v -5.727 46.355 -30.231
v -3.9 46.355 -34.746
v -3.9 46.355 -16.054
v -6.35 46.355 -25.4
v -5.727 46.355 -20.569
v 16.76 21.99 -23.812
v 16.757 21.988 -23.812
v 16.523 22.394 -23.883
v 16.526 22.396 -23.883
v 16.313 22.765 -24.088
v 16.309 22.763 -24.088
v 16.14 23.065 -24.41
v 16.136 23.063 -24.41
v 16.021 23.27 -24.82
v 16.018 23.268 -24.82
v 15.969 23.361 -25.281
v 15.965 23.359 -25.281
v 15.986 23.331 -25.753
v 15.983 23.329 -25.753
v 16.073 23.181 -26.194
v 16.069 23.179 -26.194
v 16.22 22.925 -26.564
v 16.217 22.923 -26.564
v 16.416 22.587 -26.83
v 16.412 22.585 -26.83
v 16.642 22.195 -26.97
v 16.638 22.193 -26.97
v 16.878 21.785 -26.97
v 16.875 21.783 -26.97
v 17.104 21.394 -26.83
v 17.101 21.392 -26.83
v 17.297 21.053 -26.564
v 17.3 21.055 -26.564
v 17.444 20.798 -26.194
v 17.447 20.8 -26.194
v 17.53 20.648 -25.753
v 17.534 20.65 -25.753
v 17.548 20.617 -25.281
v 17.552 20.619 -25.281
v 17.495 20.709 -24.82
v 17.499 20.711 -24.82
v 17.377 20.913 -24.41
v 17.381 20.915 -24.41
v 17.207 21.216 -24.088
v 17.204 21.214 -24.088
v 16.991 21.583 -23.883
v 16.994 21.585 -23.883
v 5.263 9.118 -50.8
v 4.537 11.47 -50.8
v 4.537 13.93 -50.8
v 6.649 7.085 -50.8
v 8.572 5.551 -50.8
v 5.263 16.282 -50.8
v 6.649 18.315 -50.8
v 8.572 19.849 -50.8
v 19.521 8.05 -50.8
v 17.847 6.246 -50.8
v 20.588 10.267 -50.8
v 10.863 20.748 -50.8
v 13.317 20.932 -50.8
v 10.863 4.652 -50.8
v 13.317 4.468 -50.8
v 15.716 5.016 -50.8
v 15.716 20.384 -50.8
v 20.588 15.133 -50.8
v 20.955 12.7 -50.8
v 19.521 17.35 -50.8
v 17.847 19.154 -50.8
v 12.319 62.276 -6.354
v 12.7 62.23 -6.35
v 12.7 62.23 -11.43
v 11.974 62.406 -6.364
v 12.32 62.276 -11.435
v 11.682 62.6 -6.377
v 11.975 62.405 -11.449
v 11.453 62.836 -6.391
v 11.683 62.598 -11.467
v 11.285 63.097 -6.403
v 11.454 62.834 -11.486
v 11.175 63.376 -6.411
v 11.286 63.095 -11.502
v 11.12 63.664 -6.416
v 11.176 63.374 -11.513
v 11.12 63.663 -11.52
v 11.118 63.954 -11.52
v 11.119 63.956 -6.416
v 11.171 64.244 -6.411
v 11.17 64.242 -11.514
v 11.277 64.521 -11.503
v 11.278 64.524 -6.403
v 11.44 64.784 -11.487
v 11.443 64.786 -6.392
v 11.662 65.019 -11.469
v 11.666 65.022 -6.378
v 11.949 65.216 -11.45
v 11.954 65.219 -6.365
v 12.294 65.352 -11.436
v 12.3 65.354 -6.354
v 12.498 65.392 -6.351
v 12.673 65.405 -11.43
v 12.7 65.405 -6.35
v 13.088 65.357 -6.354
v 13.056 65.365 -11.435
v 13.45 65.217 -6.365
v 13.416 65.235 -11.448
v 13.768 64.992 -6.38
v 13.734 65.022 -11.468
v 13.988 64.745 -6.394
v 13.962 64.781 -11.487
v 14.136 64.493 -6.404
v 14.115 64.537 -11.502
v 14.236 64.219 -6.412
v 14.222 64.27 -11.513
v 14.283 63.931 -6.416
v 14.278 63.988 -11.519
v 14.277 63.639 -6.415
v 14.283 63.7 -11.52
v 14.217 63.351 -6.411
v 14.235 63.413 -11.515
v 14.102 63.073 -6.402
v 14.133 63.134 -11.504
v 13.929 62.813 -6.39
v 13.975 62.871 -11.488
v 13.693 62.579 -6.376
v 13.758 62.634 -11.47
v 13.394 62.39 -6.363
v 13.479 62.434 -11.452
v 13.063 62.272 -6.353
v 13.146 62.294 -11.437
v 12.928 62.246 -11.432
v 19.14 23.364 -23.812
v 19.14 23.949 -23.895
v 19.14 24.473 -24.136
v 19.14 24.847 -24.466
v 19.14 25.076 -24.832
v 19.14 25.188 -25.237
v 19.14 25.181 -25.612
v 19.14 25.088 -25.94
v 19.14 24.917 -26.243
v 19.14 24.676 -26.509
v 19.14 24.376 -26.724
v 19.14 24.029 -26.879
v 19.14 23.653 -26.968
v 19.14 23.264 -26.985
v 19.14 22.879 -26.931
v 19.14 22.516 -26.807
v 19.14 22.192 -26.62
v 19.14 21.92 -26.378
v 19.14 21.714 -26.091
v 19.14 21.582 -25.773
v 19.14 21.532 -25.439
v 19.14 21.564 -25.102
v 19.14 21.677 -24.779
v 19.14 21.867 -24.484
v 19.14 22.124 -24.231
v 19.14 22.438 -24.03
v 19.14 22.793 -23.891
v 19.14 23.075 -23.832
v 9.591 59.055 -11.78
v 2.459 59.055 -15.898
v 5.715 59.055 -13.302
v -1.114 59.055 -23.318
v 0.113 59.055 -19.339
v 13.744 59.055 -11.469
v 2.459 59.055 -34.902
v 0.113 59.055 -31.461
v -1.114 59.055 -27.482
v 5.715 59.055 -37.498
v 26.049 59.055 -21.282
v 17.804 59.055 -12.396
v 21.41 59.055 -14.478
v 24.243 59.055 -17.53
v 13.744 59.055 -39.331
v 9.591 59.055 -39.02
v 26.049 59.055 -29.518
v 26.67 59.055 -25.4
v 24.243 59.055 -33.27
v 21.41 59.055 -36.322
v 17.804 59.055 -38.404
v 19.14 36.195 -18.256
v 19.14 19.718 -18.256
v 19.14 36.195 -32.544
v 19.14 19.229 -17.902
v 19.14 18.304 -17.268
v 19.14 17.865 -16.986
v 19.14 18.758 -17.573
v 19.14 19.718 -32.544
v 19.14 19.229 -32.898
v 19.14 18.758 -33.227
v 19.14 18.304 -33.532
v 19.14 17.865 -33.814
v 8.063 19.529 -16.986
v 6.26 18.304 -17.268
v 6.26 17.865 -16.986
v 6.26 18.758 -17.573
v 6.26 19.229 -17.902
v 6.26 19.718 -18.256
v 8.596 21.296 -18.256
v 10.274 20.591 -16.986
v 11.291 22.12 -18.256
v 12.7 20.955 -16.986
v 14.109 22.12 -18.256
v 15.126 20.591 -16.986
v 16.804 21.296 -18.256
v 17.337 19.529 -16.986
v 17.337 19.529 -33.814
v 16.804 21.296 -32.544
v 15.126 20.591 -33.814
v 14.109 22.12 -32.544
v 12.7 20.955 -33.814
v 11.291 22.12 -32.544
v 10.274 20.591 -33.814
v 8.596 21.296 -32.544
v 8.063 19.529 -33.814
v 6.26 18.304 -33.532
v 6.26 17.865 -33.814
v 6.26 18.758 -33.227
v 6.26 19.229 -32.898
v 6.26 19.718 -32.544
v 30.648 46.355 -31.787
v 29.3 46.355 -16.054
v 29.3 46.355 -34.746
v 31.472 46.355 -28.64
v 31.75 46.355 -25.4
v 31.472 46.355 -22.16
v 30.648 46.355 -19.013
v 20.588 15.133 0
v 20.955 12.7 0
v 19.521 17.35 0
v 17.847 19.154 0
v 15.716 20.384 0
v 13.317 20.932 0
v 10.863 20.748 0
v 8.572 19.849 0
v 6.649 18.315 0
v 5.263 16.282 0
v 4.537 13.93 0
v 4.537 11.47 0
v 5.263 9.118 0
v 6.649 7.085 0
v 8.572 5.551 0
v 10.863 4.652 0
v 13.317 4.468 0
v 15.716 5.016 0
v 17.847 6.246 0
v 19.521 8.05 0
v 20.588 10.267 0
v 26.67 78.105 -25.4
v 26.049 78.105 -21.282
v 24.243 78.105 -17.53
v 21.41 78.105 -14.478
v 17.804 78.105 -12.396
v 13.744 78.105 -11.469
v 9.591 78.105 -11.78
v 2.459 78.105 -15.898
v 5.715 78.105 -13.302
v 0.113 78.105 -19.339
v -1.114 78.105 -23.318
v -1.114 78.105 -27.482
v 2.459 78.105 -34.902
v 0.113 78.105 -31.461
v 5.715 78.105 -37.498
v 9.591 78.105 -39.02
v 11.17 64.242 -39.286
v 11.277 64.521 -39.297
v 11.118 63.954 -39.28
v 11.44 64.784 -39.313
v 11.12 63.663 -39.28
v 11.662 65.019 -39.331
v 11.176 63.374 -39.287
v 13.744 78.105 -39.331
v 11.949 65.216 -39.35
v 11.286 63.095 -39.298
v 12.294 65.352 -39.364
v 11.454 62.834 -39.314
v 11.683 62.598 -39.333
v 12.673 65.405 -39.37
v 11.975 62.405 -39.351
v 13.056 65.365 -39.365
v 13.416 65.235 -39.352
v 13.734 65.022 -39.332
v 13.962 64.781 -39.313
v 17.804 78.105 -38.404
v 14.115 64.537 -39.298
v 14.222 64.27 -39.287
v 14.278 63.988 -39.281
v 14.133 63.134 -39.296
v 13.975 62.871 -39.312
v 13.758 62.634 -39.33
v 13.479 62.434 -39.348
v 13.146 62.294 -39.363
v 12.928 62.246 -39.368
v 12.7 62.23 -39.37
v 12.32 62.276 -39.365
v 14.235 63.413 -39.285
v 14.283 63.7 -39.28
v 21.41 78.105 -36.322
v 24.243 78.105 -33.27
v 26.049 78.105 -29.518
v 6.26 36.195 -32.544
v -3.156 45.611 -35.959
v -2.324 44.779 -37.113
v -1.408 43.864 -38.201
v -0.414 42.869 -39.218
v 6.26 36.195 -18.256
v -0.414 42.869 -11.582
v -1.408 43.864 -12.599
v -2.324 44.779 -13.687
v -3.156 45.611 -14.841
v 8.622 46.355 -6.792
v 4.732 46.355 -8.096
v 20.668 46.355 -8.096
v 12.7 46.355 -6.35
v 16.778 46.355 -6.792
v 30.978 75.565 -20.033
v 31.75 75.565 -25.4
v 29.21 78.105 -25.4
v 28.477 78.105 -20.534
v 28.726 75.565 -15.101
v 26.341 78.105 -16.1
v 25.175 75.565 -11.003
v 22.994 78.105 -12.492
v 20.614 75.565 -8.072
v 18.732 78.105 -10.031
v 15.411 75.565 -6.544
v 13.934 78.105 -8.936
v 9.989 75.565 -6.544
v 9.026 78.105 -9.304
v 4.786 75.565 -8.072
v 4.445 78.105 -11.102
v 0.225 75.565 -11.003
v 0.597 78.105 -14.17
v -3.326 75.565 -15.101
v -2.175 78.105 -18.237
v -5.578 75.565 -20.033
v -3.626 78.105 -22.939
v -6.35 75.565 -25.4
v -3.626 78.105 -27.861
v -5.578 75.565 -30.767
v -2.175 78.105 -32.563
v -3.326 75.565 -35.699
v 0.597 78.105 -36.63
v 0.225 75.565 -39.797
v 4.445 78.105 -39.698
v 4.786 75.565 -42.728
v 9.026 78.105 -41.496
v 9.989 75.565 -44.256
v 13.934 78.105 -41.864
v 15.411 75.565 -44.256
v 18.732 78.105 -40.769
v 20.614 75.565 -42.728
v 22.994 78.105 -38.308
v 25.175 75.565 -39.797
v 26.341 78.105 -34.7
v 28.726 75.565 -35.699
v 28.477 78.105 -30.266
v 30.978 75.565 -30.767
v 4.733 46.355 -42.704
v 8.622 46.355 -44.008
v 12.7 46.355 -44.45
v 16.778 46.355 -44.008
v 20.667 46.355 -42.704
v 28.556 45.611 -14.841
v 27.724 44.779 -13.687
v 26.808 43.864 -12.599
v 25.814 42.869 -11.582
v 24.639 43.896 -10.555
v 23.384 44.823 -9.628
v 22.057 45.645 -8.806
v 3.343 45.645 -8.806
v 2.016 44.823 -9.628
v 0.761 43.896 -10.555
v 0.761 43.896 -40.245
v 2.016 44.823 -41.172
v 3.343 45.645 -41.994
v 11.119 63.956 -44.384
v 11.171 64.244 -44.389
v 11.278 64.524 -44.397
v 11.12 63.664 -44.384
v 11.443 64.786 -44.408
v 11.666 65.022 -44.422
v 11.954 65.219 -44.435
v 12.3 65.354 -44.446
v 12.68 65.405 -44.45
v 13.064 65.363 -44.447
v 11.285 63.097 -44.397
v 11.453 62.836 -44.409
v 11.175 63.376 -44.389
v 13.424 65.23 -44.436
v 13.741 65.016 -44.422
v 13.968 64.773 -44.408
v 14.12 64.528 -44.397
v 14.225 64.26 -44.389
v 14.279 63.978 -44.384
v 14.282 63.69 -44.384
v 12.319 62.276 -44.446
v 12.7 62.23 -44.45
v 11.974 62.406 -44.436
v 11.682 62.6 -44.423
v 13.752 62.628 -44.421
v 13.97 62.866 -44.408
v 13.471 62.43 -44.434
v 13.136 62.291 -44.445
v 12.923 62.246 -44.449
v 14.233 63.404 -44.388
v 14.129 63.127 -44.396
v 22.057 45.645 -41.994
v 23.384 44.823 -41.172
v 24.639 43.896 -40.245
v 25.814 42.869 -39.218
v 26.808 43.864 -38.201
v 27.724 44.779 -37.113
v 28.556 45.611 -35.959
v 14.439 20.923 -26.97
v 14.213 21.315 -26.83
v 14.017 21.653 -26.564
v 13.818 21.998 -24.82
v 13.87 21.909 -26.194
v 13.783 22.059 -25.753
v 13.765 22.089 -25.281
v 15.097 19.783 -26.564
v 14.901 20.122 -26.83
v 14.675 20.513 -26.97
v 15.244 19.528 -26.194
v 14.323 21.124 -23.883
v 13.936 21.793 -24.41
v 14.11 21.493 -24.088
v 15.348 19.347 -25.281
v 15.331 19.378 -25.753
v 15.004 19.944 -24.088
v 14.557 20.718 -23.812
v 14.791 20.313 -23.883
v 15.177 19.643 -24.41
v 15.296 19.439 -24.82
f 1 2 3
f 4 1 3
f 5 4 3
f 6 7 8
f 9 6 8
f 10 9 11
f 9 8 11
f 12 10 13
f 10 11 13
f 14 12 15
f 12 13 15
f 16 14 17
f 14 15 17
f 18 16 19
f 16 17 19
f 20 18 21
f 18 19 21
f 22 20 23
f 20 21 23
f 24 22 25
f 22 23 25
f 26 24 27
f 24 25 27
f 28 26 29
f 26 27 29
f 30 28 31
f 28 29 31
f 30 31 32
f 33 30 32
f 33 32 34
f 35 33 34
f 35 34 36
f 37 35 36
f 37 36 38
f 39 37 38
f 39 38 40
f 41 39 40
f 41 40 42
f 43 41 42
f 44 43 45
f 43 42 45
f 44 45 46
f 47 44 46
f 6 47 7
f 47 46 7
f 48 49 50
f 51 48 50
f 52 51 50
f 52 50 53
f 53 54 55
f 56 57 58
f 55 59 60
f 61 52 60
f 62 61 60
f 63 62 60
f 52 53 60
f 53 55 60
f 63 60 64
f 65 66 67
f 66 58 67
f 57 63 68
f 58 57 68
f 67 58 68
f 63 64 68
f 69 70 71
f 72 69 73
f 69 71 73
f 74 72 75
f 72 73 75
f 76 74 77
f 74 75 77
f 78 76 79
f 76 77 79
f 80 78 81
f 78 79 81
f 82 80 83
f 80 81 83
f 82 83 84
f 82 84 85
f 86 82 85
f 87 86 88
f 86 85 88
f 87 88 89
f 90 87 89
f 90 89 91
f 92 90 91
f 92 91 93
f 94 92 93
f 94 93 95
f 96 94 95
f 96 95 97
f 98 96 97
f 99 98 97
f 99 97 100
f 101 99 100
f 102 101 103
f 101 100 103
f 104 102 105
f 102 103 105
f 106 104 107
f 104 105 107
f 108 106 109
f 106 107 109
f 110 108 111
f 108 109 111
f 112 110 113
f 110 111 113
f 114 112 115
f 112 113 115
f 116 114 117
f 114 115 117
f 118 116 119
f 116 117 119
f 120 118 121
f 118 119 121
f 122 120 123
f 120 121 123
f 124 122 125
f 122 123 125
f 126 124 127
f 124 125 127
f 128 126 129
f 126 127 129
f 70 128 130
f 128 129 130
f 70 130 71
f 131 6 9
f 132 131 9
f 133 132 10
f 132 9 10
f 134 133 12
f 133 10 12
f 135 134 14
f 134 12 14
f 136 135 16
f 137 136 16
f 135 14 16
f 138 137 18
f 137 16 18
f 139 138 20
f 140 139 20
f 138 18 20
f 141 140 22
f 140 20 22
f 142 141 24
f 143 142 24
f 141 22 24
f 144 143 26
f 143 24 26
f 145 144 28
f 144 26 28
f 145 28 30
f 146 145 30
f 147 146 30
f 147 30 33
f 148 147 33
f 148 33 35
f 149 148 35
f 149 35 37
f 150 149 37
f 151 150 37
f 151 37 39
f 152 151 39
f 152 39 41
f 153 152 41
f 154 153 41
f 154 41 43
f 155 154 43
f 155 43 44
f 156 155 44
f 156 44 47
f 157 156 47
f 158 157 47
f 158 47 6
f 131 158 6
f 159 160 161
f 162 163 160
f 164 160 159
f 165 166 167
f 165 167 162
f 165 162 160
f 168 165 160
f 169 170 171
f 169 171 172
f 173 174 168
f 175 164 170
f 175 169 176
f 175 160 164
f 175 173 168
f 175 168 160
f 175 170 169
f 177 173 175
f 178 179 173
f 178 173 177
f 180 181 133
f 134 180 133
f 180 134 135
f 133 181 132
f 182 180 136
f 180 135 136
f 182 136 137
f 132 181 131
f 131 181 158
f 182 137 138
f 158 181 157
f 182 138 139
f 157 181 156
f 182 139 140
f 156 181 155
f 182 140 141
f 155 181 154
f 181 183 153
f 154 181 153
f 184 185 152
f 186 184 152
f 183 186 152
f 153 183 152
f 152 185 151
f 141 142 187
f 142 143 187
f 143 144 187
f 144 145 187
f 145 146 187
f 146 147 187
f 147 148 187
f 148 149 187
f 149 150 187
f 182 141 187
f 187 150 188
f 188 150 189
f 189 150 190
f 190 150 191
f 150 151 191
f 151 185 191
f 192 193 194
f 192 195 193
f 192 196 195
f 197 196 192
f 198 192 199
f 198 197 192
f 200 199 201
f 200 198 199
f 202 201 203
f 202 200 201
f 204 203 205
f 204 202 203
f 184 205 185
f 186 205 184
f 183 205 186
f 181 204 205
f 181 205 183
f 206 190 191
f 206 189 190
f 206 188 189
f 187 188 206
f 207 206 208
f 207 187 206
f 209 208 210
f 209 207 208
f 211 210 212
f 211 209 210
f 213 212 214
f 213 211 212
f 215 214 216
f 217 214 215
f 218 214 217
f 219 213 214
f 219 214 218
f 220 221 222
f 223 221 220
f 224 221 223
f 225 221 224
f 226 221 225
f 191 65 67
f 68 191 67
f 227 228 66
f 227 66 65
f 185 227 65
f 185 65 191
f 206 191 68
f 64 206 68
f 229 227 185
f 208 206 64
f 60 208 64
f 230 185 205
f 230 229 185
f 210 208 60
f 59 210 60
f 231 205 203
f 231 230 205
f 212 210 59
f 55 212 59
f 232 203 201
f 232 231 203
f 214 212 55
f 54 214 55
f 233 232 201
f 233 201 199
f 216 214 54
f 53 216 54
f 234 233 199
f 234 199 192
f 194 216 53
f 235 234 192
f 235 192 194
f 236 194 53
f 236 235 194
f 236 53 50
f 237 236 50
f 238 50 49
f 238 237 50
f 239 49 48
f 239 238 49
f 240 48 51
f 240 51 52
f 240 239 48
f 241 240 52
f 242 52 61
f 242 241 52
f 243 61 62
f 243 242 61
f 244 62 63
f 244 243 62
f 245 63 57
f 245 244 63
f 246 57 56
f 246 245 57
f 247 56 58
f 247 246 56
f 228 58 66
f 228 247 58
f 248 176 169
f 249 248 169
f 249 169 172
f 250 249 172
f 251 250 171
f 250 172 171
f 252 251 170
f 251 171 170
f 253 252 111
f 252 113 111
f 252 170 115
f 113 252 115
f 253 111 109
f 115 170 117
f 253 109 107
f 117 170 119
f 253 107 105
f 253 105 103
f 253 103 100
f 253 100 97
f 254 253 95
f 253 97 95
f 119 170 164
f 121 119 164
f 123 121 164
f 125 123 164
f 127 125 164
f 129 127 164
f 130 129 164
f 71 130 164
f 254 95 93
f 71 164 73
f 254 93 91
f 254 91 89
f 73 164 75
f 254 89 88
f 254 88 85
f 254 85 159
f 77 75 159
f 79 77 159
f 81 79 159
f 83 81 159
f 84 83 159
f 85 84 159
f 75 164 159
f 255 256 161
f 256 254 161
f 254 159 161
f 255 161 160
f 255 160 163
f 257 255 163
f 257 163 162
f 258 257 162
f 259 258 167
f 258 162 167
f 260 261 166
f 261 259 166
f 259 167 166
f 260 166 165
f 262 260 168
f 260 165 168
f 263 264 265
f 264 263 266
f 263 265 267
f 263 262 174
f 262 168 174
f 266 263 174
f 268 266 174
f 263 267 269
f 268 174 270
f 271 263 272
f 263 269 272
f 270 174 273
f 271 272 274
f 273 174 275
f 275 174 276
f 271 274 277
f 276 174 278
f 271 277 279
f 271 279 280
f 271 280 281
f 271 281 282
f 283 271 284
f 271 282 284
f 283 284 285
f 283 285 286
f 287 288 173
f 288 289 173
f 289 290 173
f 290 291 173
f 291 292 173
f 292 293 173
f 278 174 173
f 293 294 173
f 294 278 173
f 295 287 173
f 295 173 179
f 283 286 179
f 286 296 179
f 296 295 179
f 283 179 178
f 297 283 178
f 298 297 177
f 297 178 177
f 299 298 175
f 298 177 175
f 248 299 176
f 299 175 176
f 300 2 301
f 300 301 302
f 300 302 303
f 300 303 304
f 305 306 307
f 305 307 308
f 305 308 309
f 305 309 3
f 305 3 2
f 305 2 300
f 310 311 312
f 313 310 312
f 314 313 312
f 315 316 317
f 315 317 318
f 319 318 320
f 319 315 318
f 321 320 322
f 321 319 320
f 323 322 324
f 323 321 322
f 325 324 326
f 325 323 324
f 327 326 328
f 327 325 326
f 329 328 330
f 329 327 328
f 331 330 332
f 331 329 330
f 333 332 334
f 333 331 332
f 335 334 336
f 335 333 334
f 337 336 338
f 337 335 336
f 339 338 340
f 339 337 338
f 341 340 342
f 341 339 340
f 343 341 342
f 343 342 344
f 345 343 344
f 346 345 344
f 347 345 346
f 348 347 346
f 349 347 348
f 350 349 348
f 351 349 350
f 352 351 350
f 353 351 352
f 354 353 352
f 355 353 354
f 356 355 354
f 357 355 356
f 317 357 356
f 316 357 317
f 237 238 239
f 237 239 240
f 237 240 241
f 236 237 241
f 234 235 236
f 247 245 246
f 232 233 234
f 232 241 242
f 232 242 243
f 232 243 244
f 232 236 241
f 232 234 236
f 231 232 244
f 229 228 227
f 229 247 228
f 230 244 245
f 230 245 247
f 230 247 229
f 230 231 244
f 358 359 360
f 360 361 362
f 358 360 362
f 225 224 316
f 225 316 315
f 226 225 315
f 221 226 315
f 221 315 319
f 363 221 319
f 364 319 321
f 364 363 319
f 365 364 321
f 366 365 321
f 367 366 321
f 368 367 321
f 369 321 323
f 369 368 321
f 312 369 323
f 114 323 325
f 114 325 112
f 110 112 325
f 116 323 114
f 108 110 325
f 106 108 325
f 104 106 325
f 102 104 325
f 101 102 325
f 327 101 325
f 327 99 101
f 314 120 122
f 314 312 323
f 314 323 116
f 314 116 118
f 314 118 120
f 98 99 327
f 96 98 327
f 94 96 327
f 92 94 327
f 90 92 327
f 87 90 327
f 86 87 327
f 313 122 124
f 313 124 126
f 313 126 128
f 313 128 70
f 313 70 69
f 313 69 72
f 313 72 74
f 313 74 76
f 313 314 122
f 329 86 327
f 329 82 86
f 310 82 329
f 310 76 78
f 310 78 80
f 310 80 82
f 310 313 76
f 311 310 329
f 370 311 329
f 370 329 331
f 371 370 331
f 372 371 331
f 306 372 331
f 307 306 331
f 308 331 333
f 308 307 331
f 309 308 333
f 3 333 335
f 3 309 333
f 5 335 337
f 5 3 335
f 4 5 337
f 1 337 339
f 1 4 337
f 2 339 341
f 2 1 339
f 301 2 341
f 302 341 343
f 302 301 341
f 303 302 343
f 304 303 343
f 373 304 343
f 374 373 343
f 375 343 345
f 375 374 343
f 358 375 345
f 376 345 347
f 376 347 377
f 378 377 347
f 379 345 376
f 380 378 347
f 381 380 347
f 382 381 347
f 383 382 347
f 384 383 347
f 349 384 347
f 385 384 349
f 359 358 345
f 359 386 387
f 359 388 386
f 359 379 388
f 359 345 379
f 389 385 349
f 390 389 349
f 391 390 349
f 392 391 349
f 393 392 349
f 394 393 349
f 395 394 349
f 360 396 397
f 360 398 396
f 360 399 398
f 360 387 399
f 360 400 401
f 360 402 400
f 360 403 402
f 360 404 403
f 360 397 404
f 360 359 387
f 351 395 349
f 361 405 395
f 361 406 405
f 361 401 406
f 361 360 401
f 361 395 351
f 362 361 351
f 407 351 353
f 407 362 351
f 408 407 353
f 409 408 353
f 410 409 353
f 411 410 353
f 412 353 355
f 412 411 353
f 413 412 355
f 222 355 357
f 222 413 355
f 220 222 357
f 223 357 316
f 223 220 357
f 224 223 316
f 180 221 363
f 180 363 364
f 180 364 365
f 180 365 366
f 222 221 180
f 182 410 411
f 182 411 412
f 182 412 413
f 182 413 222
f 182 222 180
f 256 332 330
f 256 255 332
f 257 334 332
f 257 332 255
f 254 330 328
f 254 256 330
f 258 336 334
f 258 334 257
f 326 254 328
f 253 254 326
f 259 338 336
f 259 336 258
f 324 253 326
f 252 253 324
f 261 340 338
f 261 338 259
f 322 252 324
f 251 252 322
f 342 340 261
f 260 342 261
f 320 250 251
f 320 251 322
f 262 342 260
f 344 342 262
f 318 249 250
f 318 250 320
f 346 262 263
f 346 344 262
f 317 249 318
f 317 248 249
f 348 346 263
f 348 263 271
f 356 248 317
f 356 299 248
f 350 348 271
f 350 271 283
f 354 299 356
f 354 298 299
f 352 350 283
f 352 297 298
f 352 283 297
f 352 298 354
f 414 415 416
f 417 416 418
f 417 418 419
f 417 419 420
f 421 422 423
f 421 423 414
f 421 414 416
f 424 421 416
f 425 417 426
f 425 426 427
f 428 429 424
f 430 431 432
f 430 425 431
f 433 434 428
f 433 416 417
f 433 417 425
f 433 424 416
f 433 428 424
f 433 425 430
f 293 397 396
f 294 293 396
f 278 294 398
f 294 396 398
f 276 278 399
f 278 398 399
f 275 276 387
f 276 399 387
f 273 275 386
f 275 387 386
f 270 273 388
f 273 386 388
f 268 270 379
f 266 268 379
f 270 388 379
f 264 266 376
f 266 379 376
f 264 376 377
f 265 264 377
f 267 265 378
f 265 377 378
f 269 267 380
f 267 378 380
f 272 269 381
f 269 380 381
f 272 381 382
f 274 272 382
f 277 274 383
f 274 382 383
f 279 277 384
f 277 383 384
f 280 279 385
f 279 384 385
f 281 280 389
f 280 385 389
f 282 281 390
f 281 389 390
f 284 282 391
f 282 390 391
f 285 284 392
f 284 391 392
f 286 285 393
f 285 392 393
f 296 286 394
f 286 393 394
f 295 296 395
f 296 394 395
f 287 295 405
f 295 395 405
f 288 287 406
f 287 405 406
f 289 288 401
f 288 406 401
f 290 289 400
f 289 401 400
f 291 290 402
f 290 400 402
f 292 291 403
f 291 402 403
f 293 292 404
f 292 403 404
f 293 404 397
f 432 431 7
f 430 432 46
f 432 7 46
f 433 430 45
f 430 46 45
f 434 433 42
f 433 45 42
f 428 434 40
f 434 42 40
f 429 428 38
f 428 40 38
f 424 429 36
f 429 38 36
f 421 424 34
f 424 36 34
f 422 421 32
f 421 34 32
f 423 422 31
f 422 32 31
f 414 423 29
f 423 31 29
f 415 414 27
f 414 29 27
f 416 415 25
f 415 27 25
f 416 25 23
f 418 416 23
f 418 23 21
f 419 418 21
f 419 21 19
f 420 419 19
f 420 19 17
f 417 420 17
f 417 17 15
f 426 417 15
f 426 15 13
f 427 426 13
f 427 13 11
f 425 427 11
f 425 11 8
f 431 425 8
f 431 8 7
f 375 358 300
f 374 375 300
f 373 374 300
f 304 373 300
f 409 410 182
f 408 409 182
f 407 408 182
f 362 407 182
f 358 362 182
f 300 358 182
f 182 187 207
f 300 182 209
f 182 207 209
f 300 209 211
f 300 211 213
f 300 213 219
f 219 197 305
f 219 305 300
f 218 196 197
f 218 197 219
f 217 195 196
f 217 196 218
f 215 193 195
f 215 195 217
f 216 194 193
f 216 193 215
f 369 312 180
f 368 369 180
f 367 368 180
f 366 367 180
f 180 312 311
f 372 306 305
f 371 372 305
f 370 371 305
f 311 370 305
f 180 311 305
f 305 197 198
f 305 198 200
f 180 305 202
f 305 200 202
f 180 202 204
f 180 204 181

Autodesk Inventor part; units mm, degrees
ref_plane "YZ Plane" through (0, 0, 0) normal (1, 0, 0) x (0, 1, 0)
sketch "Sketch1" plane through (0, 0, 0) normal (0, 0, 1) x (1, 0, 0)
  arc A0 (6.35, 20.6311) -> (19.05, 20.6311) centre (12.7, 12.7) ccw projected
  circle A1 centre (12.7, 12.7) radius 8.255
  point P0 (0, 0)
  dimension "d0" = 16.51
extrude "Extrusion1" add sketch "Sketch1" against normal blind 50.8
ref_plane "Work Plane1" through (12.7, 20.955, 0) normal (0, 1, 0) x (-1, 0, 0)
sketch "Sketch2" plane through (12.7, 20.955, 0) normal (0, 1, 0) x (-1, 0, 0)
  line L0 (6.35, -15.875) -> (12.7, -15.875) projected
  line L1 (-12.7, -15.875) -> (-6.35, -15.875) projected
  line L2 (-6.35, -34.925) -> (-12.7, -34.925) projected
  line L3 (12.7, -34.925) -> (6.35, -34.925) projected
  line L4 (-8.255, -50.8) -> (8.255, -50.8) projected
  line L5 (-8.255, 0) -> (8.255, 0) projected
  line L6 (-6.4396, -15.875) -> (-6.4396, -34.925)
  line L7 (-6.4396, -34.925) -> (-6.4396, -25.4)
  line L8 (-6.4396, -34.925) -> (-6.4396, -30.1625)
  line L9 (6.4396, -15.875) -> (6.4396, -34.925)
  line L10 (6.4396, -25.4) -> (6.4396, -15.875)
  line L11 (6.4396, -20.6375) -> (6.4396, -15.875)
  line L12 (-6.4396, -32.5438) -> (6.4396, -32.5438)
  line L13 (6.4396, -32.5438) -> (6.4396, -18.2563)
  line L14 (6.4396, -18.2563) -> (-6.4396, -18.2563)
  line L15 (-6.4396, -18.2563) -> (-6.4396, -32.5438)
  point P0 (12.7, 0)
extrude "Extrusion2" add sketch "Sketch2" along normal blind 25.4 and the other way blind 8.255
chamfer "Chamfer1" distance 1.27 angle 45 2 edges at (12.7, 20.955, -18.2563) (12.7, 20.955, -32.5438)
sketch "Sketch3" plane through (12.7, 46.355, 0) normal (0, 1, 0) x (1, 0, 0)
  line L0 (6.4396, 32.5438) -> (-6.4396, 32.5438) projected
  line L1 (-6.4396, 32.5438) -> (-6.4396, 18.2563) projected
  line L2 (-6.4396, 18.2563) -> (6.4396, 18.2563) projected
  line L3 (6.4396, 18.2563) -> (6.4396, 32.5438) projected
  line L4 (-6.4396, 18.2563) -> (6.4396, 32.5438)
  line L5 (6.4396, 18.2563) -> (-6.4396, 32.5438)
  circle A0 centre (0, 25.4) radius 19.05
  circle A1 centre (0, 25.4) radius 13.97
  point P0 (-12.7, 0)
  dimension "d11" = 38.1
  dimension "d12" = 27.94
extrude "Extrusion3" add sketch "Sketch3" along normal blind 12.7 contours L4 L5 L0 | L3 L5 L4 | L5 L4 L1 | L2 L4 L5 | A1
extrude "Extrusion4" add sketch "Sketch3" along normal blind 31.75 contours A0
chamfer "Chamfer2" distance 10.16 angle 45 4 edges at (6.2604, 46.355, -25.4) (12.7, 46.355, -18.2563) (19.1396, 46.355, -25.4) (12.7, 46.355, -32.5438)
chamfer "Chamfer3" distance 2.54 angle 45 1 edges at (-6.35, 78.105, -25.4)
ref_plane "Work Plane2" through (4.445, 12.7, 0) normal (1, 0, 0) x (0, 1, 0)
sketch "Sketch4" plane through (19.1396, 17.8649, -16.9863) normal (1, 0, 0) x (0, 0, -1)
  line L0 (1.27, 18.3301) -> (15.5575, 18.3301) projected
  line L1 (1.27, 1.8534) -> (1.27, 18.3301) projected
  line L2 (16.8275, 0) -> (0, 0) projected
  line L3 (15.5575, 18.3301) -> (15.5575, 1.8534) projected
  line L4 (1.27, 1.8534) -> (15.5575, 1.8534)
  line L5 (8.4138, 1.8534) -> (8.4138, 4.3934)
  circle A0 centre (8.4138, 4.3934) radius 1.5875
  point P0 (-16.9863, -17.8649)
  dimension "d23" = 2.54
  dimension "d24" = 3.175
ref_plane "Work Plane3" through (19.1396, 17.8649, 0) normal (0.8660254, 0.5, 0) x (0, 0, 1)
sketch "Sketch5" plane through (19.1396, 17.8649, 0) normal (0.8660254, 0.5, 0) x (0, 0, 1)
  circle A0 centre (-25.4, -4.7625) radius 1.5875
  point P0 (0, 5.9017)
  dimension "d26" = 3.175
extrude "Extrusion5" cut sketch "Sketch5" along normal blind 12.7 and the other way blind 2.54
ref_plane "Work Plane4" through (12.7, 46.355, -6.35) normal (0, 0, 1) x (1, 0, 0)
sketch "Sketch6" plane through (12.7, 46.355, -6.35) normal (0, 0, 1) x (1, 0, 0)
  line L0 (16.5996, 0) -> (16.5996, 0) projected
  line L1 (16.5996, 0) -> (13.1137, -3.4859) projected
  arc A0 (13.1137, -3.4859) -> (7.9676, 0) centre (0, -17.3038) ccw projected
  line L2 (-7.9676, 0) -> (7.9676, 0) projected
  arc A1 (-7.9676, 0) -> (-13.1137, -3.4859) centre (0, -17.3038) ccw projected
  line L3 (-13.1137, -3.4859) -> (-16.5996, 0) projected
  line L4 (-16.5996, 0) -> (-16.5996, 0) projected
  line L5 (-16.5996, 0) -> (-13.1137, -3.4859) projected
  arc A2 (-7.9676, 0) -> (-13.1137, -3.4859) centre (0, -17.3038) ccw projected
  line L6 (7.9676, 0) -> (-7.9676, 0) projected
  arc A3 (13.1137, -3.4859) -> (7.9676, 0) centre (0, -17.3038) ccw projected
  line L7 (13.1137, -3.4859) -> (16.5996, 0) projected
  line L8 (19.05, 29.21) -> (-19.05, 29.21) projected
  line L9 (-19.05, 0) -> (-19.05, 29.21) projected
  line L10 (19.05, 0) -> (19.05, 29.21) projected
  line L11 (-19.05, 17.4625) -> (19.05, 17.4625)
  circle A4 centre (0, 17.4625) radius 1.5875
  point P0 (-12.7, -46.355)
  dimension "d31" = 3.175
hole "Hole1" at (12.7, 63.8175, -6.35) direction (0, 0, -1) diameter 3.175 end through all
ref_plane "Work Plane5" through (-240.4986, 445.264, 133.3441) normal (-0.8660254, -0.5, 0) x (-0.0199098, 0.0344847, -0.9992069)
sketch "Sketch7" plane through (-240.4986, 445.264, 133.3441) normal (-0.8660254, -0.5, 0) x (-0.0199098, 0.0344847, -0.9992069)
  circle A0 centre (25.4, -6.35) radius 1.5875
  point P0 (113.0953, 510.7677)
  dimension "d39" = 3.175
extrude "Extrusion6" cut sketch "Sketch7" against normal blind 12.7
properties part number "wrist-forearm"
